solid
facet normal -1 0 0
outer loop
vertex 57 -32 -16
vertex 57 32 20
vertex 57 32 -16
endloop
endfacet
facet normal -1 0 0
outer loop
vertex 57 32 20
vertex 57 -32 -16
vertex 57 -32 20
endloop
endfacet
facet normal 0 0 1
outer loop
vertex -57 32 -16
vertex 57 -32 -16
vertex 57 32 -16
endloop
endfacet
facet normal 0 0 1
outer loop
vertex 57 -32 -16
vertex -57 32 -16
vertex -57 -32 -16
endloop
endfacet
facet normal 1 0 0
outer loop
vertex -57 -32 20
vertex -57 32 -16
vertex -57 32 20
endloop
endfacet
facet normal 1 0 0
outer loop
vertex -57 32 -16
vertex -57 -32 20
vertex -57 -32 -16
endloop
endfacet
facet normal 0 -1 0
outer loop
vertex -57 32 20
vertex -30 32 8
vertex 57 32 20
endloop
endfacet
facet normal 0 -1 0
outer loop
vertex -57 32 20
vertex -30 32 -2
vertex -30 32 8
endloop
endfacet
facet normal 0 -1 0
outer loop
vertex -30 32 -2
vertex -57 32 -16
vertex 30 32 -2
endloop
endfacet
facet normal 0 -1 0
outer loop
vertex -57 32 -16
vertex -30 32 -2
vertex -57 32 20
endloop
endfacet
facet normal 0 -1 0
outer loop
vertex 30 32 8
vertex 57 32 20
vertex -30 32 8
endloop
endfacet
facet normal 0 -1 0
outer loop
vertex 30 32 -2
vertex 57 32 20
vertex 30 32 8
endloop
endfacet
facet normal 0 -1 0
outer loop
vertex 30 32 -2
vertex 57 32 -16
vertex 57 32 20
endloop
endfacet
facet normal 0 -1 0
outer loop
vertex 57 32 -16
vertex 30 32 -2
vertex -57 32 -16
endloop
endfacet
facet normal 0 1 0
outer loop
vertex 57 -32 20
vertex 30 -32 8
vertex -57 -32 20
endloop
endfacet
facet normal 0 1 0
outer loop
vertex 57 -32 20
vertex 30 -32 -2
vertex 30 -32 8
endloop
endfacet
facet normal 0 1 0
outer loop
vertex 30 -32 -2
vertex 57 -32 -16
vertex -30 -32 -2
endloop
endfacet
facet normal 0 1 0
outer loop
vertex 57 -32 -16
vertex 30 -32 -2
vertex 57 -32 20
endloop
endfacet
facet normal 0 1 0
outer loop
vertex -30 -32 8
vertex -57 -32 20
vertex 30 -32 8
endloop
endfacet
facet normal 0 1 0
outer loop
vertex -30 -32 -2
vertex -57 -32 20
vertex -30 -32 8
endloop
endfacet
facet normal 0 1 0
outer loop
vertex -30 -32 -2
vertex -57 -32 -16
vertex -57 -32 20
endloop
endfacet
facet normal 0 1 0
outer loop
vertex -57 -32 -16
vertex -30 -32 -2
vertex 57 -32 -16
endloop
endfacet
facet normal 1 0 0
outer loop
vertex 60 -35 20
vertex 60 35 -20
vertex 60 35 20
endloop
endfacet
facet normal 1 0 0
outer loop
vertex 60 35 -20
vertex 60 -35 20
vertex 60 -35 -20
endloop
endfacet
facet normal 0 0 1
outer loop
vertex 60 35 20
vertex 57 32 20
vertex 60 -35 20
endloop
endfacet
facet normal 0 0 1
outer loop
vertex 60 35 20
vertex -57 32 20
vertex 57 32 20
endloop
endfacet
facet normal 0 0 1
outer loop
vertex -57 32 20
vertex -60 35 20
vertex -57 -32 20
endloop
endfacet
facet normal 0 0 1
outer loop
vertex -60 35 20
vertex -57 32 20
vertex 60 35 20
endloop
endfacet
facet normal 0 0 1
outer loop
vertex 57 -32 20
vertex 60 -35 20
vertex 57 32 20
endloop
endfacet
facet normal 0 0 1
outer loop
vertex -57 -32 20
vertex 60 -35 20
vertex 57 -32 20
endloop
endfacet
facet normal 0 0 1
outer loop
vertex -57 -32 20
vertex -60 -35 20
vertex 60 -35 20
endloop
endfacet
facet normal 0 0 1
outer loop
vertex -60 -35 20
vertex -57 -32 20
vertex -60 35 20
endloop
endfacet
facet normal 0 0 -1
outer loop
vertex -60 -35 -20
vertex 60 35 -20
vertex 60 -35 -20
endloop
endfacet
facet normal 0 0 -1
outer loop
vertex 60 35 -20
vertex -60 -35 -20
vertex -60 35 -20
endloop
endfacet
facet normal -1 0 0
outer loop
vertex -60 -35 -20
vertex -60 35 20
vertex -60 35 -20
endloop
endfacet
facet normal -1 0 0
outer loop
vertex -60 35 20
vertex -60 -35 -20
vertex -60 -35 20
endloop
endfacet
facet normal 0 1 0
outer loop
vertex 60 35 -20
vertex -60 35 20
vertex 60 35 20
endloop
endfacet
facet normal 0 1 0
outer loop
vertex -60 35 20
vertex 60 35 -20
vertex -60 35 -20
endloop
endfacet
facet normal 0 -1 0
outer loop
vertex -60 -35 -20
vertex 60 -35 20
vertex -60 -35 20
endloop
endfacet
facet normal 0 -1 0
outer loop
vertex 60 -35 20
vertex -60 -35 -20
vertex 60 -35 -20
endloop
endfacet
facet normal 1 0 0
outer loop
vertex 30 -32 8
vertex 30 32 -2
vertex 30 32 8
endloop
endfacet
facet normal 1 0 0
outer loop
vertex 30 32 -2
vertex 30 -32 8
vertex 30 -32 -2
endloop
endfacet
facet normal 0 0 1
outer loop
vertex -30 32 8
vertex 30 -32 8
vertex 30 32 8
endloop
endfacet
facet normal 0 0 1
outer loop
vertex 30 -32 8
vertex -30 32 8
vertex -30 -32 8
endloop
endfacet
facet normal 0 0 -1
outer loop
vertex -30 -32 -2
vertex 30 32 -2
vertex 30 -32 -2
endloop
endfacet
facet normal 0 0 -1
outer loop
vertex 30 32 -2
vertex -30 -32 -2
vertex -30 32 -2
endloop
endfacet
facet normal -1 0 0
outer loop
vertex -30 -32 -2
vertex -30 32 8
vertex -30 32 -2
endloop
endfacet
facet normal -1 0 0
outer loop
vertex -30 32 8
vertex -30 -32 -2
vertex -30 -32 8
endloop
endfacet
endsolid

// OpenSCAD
// Buffer Tank for Mini Horizontal Gel Electrophoresis
// Units: millimetres
// Orientation: Rests on XY plane at z=0, builds upward (+Z)
// Centred on origin in X and Y

$fn = 128; // High resolution for smooth curves and accurate hole sizing

// --- Outer Dimensions (User Measured) ---
W_OUT_X = 120; // Width along X
D_OUT_Y = 70;  // Depth along Y
H_OUT_Z = 40;  // Height along Z

// --- Wall and Floor Thickness ---
T_WALL = 3;    // Wall thickness
T_FLOOR = 3;   // Floor thickness

// --- Inner Dimensions (Calculated) ---
W_IN_X = W_OUT_X - 2*T_WALL;
D_IN_Y = D_OUT_Y - 2*T_WALL;
H_IN_Z = H_OUT_Z - T_FLOOR;

// --- Platform Dimensions ---
P_L_X = 60;    // Platform length along X (total)
P_W_Y = D_IN_Y; // Platform width along Y (full inner width)
P_H_REL = 10;  // Platform height relative to inner floor
P_Z_ABS = T_FLOOR + P_H_REL; // Absolute Z position of platform top

// --- Electrode Hole Dimensions ---
D_HOLE = 2;    // Hole diameter
// Hole location: y = 0, z = 30 (relative to bottom of tank)
// Since tank is centred in Y, y=0 is the geometric centre.
// Z=30 is absolute height from bottom.

// --- Generation ---

module tank_base() {
    // Create the main outer block
    difference() {
        // Outer Shell
        cube([W_OUT_X, D_OUT_Y, H_OUT_Z], center = true);
        
        // Cut out the inner void (open top)
        // Inner dimensions: X, Y, Z
        // We subtract a box that is open at the top (Z > 0 relative to inner floor)
        // To ensure clean cut, we extend slightly past the top face
        translate([0, 0, T_FLOOR]) {
            difference() {
                cube([W_IN_X, D_IN_Y, H_IN_Z + 1], center = true);
                // Cut the top face to make it open
                translate([0, 0, H_IN_Z]) {
                    cube([W_IN_X + 0.1, D_IN_Y + 0.1, 1], center = true);
                }
            }
        }
    }
}

module platform() {
    // Solid raised platform
    // Dimensions: P_L_X (X), P_W_Y (Y), P_H_REL (Z)
    // Position: Centred in X, Full width in Y, Sitting on inner floor
    translate([0, 0, T_FLOOR]) {
        cube([P_L_X, P_W_Y, P_H_REL], center = true);
    }
}

module electrode_holes() {
    // Two holes: Left and Right ends
    // Location: y = 0 (centre), z = 30 (absolute)
    // Direction: Along X axis
    
    for (i = [-1, 1]) {
        // i = -1 for Left, i = 1 for Right
        translate([i * (W_OUT_X / 2), 0, 30]) {
            cylinder(h = W_OUT_X + 1, r = D_HOLE / 2, $fn = 64);
        }
    }
}

module buffer_tank() {
    union() {
        tank_base();
        platform();
    }
    
    // Apply holes using difference
    difference() {
        // Re-create the solid union to ensure holes cut through everything correctly
        // Note: In OpenSCAD, it is often safer to union the main body first, 
        // then apply difference for holes to avoid boolean errors with floating point.
        union() {
            tank_base();
            platform();
        }
        
        // Cut the electrode holes
        electrode_holes();
    }
}

// --- Final Assembly ---
// Centre the entire assembly on the origin
translate([0, 0, 0]) {
    buffer_tank();
}
